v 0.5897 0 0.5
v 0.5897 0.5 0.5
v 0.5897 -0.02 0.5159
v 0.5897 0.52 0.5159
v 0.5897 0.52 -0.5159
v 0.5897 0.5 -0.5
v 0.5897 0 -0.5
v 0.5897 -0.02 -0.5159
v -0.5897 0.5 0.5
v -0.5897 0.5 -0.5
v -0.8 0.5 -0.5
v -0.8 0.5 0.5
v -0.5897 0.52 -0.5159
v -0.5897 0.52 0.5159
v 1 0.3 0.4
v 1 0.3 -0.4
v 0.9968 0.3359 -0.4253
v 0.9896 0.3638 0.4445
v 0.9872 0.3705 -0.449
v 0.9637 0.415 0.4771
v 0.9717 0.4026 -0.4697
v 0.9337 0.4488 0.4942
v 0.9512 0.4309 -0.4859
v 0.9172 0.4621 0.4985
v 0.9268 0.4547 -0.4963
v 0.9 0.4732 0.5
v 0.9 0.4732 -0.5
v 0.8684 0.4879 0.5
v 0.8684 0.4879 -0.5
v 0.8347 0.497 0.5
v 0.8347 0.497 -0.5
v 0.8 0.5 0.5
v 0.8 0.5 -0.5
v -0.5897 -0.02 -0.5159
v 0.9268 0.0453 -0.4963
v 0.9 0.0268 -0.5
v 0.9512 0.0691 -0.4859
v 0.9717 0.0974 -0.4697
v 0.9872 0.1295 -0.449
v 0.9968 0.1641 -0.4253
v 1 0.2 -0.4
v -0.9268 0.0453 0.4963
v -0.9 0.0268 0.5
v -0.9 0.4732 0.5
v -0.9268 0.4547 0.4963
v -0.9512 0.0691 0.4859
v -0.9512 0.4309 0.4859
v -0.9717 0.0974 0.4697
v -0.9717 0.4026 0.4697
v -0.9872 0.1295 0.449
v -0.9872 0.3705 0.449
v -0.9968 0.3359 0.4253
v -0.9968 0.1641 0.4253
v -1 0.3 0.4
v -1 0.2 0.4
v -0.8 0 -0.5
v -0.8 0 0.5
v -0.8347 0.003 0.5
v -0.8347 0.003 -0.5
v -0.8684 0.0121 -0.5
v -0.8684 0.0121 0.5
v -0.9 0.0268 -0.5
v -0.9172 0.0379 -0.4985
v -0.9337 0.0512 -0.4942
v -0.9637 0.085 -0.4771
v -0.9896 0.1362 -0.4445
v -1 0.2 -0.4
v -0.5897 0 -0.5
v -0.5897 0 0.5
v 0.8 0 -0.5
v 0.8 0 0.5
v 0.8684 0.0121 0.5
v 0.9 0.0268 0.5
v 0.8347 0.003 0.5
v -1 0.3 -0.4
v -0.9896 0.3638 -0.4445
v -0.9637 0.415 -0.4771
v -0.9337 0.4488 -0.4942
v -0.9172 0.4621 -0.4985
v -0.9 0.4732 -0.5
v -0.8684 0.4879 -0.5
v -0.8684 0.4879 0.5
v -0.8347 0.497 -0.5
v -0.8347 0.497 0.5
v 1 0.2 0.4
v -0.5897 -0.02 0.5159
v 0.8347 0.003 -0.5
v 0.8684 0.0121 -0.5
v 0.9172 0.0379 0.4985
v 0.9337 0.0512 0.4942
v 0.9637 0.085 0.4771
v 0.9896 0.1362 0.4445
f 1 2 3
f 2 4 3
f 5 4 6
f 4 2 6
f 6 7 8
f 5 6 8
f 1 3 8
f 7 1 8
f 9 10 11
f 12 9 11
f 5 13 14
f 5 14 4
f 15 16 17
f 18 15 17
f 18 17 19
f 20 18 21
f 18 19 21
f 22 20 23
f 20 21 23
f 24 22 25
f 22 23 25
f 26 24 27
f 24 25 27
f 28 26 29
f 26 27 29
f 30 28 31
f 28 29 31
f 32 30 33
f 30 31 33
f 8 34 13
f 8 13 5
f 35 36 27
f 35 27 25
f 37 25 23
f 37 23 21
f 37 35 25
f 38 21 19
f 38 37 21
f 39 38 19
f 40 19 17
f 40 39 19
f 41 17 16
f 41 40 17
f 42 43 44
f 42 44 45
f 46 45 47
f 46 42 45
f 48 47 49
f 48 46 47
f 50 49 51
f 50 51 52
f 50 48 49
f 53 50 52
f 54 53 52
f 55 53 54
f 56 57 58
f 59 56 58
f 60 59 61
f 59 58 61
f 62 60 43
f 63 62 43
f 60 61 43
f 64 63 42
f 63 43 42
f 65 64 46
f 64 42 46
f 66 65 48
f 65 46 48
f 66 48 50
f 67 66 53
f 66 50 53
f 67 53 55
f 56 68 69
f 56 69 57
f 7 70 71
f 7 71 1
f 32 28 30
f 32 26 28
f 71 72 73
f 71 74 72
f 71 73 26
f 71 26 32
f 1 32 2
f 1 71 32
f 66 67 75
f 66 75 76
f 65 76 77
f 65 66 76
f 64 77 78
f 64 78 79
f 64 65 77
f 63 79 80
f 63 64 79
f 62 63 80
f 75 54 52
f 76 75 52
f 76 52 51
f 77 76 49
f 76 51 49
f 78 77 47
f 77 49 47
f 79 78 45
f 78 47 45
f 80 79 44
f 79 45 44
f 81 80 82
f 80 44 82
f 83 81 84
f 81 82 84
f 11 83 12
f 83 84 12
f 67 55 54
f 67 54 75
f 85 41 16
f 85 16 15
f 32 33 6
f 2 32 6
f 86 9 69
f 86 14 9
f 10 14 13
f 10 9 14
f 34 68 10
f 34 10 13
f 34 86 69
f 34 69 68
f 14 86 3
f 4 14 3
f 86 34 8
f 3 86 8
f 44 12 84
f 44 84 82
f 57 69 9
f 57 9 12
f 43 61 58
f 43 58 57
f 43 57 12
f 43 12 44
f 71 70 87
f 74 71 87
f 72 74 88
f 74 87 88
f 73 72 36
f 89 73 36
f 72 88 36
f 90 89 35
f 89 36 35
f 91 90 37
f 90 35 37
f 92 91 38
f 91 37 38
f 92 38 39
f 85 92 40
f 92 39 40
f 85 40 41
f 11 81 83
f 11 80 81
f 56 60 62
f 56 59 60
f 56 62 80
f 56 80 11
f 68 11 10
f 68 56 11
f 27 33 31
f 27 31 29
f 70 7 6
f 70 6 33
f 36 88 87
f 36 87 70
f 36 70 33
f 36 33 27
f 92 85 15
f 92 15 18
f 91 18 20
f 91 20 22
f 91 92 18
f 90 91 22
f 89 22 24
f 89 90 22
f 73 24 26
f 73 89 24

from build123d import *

# Parameters (mm, degrees)
BOSS_EXTRU_1_DEPTH      = 0.5
BOSS_EXTRU_2_DEPTH      = 0.02
BOSS_EXTRU_2_DEPTH_BACK = 0.52
ESQUISSE2_W             = 1.179373422
ESQUISSE2_H             = 1.03185074
CONG_2_R                = 0.2
CONG_3_R                = 0.2
CONG_4_R                = 0.2
CONG_5_R                = 0.2


with BuildPart() as part:
    # Esquisse1 → Boss.-Extru.1 (new body)
    with BuildSketch(Plane(origin=(0, 0, 0), x_dir=(1, 0, 0), z_dir=(0, 1, 0))):
        with BuildLine():
            Line((0.9, -0.5), (-0.9, -0.5))
            ThreePointArc((-0.9, -0.5), (-0.970710678, -0.470710678), (-1, -0.4))
            Line((-1, -0.4), (-1, 0.4))
            ThreePointArc((-1, 0.4), (-0.970710678, 0.470710678), (-0.9, 0.5))
            Line((-0.9, 0.5), (0.9, 0.5))
            ThreePointArc((0.9, 0.5), (0.970710678, 0.470710678), (1, 0.4))
            Line((1, 0.4), (1, -0.4))
            ThreePointArc((1, -0.4), (0.970710678, -0.470710678), (0.9, -0.5))
        make_face()
    extrude(amount=BOSS_EXTRU_1_DEPTH)

    # Esquisse2 → Boss.-Extru.2 (add, two sides: drawn at the far end of the back side and taken through both)
    with BuildSketch(Plane(origin=(0, 0.5, 0), x_dir=(1, 0, 0), z_dir=(0, 1, 0)).offset(-BOSS_EXTRU_2_DEPTH_BACK)):
        Rectangle(ESQUISSE2_W, ESQUISSE2_H)
    extrude(amount=BOSS_EXTRU_2_DEPTH + BOSS_EXTRU_2_DEPTH_BACK)

    # Congé2
    # the kernel refuses this fillet: 0.2 mm, written as the material it takes off along each edge
    with BuildSketch(Plane(origin=(-1, 0, 0.9), x_dir=(1, 0, 0), z_dir=(0, 0, -1))) as cong_2_piece_1:
        with BuildLine():
            CenterArc((CONG_2_R, -CONG_2_R), CONG_2_R, 90, 90)
            Line((0, -CONG_2_R), (0, 0))
            Line((0, 0), (CONG_2_R, 0))
        make_face()
    extrude(amount=1.8, mode=Mode.SUBTRACT)

    # Congé3
    # the kernel refuses this fillet: 0.2 mm, written as the material it takes off along each edge
    with BuildSketch(Plane(origin=(-1, 0.5, 0.9), x_dir=(1, 0, 0), z_dir=(0, 0, -1))) as cong_3_piece_1:
        with BuildLine():
            CenterArc((CONG_3_R, CONG_3_R), CONG_3_R, 180, 90)
            Line((0, CONG_3_R), (0, 0))
            Line((0, 0), (CONG_3_R, 0))
        make_face()
    extrude(amount=1.8, mode=Mode.SUBTRACT)

    # Congé4
    # the kernel refuses this fillet: 0.2 mm, written as the material it takes off along each edge
    with BuildSketch(Plane(origin=(1, 0.5, -0.9), x_dir=(-1, 0, 0), z_dir=(0, 0, 1))) as cong_4_piece_1:
        with BuildLine():
            CenterArc((CONG_4_R, CONG_4_R), CONG_4_R, 180, 90)
            Line((0, CONG_4_R), (0, 0))
            Line((0, 0), (CONG_4_R, 0))
        make_face()
    extrude(amount=1.8, mode=Mode.SUBTRACT)

    # Congé5
    # the kernel refuses this fillet: 0.2 mm, written as the material it takes off along each edge
    with BuildSketch(Plane(origin=(1, 0, -0.9), x_dir=(-1, 0, 0), z_dir=(0, 0, 1))) as cong_5_piece_1:
        with BuildLine():
            CenterArc((CONG_5_R, -CONG_5_R), CONG_5_R, 90, 90)
            Line((0, -CONG_5_R), (0, 0))
            Line((0, 0), (CONG_5_R, 0))
        make_face()
    extrude(amount=1.8, mode=Mode.SUBTRACT)


solid = part.part
